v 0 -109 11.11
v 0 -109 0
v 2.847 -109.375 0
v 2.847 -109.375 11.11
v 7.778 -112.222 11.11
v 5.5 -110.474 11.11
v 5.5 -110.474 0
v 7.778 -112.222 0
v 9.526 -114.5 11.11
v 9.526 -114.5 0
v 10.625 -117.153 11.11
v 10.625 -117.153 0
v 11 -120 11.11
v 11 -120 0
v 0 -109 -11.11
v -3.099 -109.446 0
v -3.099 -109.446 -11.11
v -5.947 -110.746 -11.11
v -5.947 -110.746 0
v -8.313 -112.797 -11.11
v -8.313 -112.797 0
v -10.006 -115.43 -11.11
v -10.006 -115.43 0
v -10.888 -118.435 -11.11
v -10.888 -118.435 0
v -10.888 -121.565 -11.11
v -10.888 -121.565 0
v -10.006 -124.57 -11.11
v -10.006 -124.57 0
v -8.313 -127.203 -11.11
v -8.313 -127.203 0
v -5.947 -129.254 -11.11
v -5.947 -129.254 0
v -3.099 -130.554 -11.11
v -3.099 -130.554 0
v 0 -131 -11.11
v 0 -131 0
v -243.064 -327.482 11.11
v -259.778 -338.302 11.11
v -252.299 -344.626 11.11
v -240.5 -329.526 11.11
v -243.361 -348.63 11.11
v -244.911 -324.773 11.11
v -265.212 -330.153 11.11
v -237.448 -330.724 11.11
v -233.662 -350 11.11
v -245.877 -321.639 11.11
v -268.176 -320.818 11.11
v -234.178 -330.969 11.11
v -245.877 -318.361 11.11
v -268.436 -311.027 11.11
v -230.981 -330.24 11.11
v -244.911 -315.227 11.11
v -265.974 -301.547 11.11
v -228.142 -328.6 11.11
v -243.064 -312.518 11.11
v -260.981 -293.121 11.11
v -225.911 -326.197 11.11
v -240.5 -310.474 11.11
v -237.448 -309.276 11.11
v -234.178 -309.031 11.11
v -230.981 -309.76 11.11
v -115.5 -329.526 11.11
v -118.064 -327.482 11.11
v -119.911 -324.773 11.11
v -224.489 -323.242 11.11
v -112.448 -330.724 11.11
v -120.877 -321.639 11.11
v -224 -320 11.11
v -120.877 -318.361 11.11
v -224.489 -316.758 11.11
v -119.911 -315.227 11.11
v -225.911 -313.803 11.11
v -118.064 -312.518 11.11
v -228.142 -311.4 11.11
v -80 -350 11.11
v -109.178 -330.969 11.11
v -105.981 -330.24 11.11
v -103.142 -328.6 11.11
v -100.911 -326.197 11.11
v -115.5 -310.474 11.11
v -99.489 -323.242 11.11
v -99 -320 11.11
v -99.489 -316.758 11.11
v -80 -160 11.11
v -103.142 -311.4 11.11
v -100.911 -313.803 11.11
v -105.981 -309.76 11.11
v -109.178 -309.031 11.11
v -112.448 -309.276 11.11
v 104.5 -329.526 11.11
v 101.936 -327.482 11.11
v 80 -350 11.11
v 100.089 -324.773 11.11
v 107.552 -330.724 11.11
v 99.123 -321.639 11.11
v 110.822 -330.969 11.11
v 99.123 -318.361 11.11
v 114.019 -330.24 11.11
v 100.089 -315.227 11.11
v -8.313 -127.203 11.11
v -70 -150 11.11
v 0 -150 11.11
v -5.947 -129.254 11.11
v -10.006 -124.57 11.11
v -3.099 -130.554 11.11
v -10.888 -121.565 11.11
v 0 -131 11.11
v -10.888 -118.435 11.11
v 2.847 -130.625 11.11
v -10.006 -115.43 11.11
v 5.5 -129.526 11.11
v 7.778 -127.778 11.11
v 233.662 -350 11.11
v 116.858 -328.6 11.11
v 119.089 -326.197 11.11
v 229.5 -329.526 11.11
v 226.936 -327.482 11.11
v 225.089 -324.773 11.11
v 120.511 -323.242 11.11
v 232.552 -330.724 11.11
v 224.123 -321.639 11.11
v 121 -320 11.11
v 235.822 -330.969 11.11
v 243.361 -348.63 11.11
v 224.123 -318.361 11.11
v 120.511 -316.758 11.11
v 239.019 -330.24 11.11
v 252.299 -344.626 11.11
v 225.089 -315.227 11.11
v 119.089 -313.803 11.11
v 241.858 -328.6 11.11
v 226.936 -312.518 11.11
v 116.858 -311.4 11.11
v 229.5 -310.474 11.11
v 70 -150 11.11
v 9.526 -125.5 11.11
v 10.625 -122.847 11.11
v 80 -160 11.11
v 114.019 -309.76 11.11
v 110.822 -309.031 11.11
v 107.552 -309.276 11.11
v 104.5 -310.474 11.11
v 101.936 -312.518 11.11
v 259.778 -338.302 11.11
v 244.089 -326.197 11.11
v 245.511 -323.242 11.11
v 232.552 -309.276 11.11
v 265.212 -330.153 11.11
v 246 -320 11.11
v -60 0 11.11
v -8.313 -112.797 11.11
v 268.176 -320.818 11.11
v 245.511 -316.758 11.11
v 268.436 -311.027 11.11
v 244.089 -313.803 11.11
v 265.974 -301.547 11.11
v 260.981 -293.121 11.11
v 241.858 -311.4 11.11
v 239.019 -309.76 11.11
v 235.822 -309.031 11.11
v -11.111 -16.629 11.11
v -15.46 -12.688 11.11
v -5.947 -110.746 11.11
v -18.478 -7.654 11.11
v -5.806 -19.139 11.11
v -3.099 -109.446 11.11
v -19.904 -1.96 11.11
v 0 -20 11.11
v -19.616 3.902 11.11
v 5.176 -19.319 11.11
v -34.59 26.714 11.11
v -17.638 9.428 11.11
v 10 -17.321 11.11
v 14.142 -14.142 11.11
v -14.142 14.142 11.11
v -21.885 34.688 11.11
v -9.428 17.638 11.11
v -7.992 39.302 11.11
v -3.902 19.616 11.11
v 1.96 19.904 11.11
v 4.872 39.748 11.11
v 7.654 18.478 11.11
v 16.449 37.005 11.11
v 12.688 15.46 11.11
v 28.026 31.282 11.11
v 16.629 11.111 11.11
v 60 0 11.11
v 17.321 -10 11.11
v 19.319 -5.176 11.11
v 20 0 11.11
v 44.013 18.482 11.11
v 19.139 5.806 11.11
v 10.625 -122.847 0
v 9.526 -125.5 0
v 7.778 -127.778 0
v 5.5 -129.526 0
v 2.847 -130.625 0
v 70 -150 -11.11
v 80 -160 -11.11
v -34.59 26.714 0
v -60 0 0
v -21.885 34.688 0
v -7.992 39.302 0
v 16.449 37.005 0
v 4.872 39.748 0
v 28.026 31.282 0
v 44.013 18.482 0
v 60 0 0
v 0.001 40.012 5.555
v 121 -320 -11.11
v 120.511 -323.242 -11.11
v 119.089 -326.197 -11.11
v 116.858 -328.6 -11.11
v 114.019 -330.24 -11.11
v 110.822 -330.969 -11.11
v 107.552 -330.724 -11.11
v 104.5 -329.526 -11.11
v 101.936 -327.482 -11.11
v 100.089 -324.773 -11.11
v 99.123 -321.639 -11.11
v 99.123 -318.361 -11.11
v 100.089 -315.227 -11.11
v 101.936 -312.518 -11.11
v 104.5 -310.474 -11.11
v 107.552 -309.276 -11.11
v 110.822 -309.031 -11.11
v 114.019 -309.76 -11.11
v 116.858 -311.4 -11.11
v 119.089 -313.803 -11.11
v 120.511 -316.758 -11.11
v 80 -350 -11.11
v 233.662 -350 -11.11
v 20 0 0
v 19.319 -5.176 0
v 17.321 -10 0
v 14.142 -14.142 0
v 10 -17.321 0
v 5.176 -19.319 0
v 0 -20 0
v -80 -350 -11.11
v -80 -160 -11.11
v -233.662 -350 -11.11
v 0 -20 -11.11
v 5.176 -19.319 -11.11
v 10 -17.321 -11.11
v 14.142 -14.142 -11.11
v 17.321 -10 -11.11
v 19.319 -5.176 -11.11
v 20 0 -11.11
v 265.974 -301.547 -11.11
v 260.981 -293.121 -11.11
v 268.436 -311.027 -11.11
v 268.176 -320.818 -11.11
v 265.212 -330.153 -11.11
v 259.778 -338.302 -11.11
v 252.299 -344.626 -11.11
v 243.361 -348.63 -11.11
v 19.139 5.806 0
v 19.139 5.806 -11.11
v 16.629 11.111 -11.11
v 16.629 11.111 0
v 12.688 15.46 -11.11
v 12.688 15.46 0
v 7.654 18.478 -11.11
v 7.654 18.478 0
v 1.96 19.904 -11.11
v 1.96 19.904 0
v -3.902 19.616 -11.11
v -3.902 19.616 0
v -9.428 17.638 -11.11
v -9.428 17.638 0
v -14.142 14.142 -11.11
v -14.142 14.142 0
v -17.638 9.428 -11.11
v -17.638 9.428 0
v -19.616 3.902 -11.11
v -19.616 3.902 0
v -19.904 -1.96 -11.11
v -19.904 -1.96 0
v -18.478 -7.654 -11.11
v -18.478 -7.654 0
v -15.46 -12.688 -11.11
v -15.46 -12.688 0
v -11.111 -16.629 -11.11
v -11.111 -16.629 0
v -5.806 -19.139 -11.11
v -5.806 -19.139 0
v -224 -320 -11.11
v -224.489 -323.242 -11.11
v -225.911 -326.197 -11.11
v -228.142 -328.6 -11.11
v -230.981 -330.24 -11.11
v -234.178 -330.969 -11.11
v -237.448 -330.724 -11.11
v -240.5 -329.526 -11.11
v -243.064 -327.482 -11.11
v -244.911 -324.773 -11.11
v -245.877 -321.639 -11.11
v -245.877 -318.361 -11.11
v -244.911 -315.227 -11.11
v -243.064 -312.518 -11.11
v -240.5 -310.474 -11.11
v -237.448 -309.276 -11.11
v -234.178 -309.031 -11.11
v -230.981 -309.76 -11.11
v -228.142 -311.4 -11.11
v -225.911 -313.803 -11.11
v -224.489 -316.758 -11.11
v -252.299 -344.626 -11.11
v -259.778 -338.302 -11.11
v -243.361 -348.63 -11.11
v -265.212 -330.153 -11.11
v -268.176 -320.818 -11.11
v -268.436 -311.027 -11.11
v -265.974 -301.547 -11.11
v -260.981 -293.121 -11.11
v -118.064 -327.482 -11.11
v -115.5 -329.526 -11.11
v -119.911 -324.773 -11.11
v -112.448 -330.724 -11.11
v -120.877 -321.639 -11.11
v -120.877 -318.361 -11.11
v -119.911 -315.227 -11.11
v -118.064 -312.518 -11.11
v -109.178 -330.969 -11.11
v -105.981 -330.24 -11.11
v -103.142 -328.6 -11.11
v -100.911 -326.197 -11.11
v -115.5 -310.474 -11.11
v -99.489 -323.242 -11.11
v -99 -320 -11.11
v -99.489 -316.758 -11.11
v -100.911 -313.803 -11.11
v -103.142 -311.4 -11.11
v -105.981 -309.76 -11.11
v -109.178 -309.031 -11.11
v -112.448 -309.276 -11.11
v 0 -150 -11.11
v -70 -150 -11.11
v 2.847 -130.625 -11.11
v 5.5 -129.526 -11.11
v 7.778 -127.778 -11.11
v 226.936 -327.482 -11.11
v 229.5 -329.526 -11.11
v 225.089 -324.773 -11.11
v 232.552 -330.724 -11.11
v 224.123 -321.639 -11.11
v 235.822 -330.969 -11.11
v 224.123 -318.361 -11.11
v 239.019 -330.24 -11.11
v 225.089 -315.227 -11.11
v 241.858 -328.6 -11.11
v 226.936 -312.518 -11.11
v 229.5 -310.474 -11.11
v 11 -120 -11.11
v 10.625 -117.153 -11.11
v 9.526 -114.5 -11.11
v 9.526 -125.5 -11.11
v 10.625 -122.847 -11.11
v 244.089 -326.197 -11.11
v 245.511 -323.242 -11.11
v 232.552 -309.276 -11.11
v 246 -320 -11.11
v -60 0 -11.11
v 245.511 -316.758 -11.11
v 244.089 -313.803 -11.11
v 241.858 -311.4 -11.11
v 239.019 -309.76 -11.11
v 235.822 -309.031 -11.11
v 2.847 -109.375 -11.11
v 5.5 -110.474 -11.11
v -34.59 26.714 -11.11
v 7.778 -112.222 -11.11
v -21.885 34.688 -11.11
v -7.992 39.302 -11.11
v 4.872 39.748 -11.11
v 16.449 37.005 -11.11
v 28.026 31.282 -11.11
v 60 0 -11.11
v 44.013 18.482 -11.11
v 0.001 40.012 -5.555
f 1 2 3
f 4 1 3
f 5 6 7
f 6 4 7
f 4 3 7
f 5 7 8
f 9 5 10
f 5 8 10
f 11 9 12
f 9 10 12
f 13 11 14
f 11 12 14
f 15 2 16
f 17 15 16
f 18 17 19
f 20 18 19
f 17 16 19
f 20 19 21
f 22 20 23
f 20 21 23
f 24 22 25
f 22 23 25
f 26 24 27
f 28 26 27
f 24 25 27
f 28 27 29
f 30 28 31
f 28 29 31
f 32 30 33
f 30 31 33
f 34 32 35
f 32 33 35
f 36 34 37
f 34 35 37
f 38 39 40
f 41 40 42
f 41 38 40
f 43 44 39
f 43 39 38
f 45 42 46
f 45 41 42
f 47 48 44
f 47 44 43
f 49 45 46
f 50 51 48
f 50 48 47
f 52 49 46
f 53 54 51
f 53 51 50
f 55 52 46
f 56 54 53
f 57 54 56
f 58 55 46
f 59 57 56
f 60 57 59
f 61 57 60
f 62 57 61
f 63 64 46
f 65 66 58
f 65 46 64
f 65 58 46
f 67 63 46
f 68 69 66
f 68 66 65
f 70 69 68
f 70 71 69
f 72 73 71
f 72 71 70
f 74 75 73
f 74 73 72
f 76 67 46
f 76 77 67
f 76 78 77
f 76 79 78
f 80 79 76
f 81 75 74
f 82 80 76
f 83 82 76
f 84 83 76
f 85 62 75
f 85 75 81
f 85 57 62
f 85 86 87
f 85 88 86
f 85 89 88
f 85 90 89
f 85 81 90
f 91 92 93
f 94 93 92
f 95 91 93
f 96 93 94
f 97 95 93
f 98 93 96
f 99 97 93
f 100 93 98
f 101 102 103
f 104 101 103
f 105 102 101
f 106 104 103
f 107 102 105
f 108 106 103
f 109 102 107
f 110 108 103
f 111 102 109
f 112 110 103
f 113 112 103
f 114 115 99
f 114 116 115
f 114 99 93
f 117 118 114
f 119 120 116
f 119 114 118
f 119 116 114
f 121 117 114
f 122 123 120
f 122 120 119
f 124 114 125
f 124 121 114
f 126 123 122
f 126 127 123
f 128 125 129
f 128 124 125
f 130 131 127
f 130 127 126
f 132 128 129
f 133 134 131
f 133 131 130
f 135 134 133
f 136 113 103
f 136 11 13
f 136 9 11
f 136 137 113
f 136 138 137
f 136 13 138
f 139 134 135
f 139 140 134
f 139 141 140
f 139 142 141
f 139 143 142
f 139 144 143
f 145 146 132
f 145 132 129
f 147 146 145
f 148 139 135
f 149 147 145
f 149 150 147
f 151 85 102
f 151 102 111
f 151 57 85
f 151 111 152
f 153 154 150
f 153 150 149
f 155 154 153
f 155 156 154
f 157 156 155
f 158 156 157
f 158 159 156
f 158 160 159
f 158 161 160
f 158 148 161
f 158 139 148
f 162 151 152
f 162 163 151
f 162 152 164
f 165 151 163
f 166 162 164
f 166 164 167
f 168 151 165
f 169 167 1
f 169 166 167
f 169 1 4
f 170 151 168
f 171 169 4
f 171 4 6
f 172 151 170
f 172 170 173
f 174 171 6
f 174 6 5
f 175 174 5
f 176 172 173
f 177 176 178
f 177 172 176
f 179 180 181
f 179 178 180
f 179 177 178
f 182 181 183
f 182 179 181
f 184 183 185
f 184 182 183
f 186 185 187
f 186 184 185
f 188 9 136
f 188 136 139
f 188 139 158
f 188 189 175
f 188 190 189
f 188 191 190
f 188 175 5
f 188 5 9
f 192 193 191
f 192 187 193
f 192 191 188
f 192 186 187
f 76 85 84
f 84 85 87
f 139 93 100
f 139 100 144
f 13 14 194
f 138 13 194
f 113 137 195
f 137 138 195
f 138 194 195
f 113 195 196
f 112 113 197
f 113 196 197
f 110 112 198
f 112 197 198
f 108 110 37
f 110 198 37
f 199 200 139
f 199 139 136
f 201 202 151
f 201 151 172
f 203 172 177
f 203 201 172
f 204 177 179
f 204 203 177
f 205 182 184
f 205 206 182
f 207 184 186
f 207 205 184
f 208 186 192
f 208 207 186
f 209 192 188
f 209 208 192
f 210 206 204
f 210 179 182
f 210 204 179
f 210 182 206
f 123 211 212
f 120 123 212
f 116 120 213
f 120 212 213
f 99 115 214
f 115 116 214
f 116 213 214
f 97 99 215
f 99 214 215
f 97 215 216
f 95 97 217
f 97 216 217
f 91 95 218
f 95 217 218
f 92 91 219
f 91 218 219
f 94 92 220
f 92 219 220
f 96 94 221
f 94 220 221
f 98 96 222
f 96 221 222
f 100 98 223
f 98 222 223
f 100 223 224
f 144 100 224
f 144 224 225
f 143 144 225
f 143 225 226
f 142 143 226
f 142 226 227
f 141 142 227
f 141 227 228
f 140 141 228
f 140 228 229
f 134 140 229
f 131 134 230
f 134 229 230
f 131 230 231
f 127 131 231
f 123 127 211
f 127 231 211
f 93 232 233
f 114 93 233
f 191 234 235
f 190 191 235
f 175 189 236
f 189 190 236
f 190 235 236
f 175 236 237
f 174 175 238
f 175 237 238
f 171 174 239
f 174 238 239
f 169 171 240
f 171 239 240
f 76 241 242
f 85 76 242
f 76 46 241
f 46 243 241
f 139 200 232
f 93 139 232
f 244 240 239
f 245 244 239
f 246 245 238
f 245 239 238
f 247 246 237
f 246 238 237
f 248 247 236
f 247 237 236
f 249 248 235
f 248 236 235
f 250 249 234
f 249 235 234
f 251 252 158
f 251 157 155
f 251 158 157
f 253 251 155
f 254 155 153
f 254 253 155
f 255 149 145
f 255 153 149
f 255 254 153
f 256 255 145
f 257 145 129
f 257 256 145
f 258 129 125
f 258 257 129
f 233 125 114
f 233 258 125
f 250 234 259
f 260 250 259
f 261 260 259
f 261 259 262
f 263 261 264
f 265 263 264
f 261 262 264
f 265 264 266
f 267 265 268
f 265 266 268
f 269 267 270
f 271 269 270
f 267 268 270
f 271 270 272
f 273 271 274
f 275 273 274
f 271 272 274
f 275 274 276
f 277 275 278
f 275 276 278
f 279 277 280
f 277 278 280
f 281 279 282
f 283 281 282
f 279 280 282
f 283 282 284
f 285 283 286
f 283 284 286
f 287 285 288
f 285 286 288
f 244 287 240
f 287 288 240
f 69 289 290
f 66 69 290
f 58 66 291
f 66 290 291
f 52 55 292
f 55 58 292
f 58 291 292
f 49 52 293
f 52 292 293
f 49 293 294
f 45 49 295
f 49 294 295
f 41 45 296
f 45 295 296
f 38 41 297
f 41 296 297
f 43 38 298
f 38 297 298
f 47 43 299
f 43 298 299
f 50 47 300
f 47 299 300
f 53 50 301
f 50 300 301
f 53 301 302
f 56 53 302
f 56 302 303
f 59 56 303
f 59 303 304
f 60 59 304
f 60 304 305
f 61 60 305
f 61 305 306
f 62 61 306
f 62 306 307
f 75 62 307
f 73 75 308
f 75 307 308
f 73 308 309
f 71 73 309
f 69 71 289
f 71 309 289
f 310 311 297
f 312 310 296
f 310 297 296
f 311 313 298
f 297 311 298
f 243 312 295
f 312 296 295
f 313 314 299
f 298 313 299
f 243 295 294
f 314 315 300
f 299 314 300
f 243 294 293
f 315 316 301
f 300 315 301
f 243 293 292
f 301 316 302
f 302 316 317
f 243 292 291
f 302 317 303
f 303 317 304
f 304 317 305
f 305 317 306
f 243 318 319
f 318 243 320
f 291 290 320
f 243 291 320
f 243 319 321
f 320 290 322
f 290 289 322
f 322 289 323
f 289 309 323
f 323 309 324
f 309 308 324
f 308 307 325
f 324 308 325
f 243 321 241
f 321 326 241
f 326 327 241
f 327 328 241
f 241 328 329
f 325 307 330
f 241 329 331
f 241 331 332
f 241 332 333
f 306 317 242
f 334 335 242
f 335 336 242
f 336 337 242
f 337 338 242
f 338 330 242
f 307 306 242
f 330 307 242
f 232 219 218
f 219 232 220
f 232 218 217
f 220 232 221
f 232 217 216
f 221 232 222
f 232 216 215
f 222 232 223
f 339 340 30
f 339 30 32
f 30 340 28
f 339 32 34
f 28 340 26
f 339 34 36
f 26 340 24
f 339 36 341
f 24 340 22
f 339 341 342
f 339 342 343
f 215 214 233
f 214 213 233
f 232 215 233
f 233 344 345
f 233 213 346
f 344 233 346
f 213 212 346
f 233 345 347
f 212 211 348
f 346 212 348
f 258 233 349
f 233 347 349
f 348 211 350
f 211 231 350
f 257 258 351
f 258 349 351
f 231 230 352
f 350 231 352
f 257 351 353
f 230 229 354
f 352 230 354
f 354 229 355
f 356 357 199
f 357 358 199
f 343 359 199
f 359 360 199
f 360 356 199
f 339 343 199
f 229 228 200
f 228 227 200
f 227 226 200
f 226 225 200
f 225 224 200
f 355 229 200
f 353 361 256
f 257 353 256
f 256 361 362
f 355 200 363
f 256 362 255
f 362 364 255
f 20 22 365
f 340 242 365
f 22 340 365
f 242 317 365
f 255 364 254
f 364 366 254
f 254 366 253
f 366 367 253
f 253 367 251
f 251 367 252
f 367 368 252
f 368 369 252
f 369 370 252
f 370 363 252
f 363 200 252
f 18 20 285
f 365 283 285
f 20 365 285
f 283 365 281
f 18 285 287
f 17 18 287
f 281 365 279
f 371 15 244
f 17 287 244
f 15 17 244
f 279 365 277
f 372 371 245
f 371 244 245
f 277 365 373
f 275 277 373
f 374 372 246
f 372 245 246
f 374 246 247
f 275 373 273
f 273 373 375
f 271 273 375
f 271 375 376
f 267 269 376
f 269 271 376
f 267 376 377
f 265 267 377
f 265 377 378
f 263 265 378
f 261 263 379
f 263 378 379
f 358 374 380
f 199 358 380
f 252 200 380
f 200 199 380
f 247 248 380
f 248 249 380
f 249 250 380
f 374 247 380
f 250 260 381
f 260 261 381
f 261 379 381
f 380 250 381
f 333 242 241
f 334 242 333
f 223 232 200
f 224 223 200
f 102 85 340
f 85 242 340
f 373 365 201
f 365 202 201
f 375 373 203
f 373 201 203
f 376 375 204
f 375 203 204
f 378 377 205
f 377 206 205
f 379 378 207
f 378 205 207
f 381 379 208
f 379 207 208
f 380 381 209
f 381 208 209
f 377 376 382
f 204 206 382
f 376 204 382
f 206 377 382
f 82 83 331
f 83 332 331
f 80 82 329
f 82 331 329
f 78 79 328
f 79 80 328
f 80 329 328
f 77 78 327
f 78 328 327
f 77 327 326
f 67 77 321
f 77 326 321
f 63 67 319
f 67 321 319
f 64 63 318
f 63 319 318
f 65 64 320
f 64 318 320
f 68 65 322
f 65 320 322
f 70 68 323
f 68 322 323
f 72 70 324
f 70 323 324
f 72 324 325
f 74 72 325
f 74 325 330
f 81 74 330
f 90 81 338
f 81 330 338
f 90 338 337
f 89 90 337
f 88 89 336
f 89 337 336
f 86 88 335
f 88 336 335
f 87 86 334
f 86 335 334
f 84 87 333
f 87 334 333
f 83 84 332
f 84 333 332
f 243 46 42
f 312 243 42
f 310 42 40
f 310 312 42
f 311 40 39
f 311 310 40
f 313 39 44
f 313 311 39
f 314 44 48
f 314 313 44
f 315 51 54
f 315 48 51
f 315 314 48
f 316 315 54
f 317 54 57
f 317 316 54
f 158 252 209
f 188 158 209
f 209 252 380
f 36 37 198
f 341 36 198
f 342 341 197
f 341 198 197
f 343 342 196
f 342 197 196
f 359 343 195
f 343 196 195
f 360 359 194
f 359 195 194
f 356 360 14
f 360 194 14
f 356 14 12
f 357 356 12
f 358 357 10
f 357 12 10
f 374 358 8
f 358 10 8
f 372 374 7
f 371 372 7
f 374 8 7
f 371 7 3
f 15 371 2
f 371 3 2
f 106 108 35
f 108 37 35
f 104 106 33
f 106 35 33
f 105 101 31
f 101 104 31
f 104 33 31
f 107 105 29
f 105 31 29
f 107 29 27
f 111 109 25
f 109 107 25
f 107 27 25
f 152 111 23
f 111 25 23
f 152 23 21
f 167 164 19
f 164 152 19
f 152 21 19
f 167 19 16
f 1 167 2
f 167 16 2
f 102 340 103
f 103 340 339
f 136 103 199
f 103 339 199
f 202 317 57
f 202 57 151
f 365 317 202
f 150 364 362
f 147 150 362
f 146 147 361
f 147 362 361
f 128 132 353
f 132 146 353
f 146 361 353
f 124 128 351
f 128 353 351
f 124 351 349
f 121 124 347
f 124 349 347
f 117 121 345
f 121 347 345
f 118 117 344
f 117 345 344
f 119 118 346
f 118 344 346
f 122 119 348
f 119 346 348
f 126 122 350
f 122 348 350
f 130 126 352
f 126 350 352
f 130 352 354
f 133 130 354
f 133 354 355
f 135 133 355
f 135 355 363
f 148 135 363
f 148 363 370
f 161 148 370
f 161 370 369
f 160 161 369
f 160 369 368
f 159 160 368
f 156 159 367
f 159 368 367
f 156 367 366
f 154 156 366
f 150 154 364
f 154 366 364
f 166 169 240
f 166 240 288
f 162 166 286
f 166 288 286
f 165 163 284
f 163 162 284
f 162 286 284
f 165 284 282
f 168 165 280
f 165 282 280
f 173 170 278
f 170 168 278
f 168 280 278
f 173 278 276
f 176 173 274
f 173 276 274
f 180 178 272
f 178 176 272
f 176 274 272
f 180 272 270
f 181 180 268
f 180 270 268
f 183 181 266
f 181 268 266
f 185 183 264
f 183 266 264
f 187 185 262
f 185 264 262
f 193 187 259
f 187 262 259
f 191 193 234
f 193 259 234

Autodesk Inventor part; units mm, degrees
ref_plane "YZ Plane" through (0, 0, 0) normal (1, 0, 0) x (0, 1, 0)
ref_plane "XZ Plane" through (0, 0, 0) normal (0, 1, 0) x (-1, 0, 0)
ref_plane "XY Plane" through (0, 0, 0) normal (0, 0, 1) x (1, 0, 0)
sketch "Sketch1" plane through (0, 0, 0) normal (0, 0, 1) x (1, 0, 0)
  circle A0 centre (0, 0) radius 20
  circle A1 centre (0, -120) radius 11
  circle A2 centre (-235, -320) radius 11
  circle A3 centre (235, -320) radius 11
  arc A4 (233.6625, -350) -> (260.9808, -293.1206) centre (233.6625, -315) ccw
  line L0 (260.9808, -293.1206) -> (60, 0)
  line L1 (0, 0) -> (0, -429.6945)
  arc A5 (-260.9808, -293.1206) -> (-233.6625, -350) centre (-233.6625, -315) ccw
  line L2 (-260.9808, -293.1206) -> (-60, 0)
  spline S0 degree 2 poles (-60, 0) (0.0011, 80.0234) (60, 0) knots 0 0 0 1 1 1
  line L3 (0, -150) -> (70, -150)
  line L4 (-80, -240) -> (-80, -160)
  line L5 (-70, -150) -> (0, -150)
  line L6 (-80, -160) -> (-70, -150)
  line L7 (80, -160) -> (70, -150)
  line L8 (-80, -160) -> (-80, -350)
  line L9 (80, -160) -> (80, -350)
  line L10 (-233.6625, -350) -> (-80, -350)
  line L11 (80, -350) -> (233.6625, -350)
  circle A6 centre (-110, -320) radius 11
  circle A7 centre (110, -320) radius 11
  point P0 (0.0008, 40.0117)
  point P1 (80, -150)
  point P2 (60, -250)
  point P3 (-80, -150)
  dimension "d0" = 40
  dimension "d1" = 22
  dimension "d3" = 22
  dimension "d4" = 22
  dimension "d5" = 120
  dimension "d9" = 35
  dimension "d14" = 60
  dimension "d15" = 60
  dimension "d16" = 80
  dimension "d19" = 10
  dimension "d20" = 10
  dimension "d21" = 10
  dimension "d22" = 10
  dimension "d27" = 30
  dimension "d30" = 22
  dimension "d31" = 22
  dimension "d32" = 30
  dimension "d33" = 30
  dimension "d36" = 160
extrude "Extrusion2" add sketch "Sketch1" along normal mid plane 22.22
equation "\"d20\" = d19"
equation "\"d21\" = d19"
equation "\"d22\" = d21"
properties part number "Corpo_Suporte_4_Cabos_Modelo3"
